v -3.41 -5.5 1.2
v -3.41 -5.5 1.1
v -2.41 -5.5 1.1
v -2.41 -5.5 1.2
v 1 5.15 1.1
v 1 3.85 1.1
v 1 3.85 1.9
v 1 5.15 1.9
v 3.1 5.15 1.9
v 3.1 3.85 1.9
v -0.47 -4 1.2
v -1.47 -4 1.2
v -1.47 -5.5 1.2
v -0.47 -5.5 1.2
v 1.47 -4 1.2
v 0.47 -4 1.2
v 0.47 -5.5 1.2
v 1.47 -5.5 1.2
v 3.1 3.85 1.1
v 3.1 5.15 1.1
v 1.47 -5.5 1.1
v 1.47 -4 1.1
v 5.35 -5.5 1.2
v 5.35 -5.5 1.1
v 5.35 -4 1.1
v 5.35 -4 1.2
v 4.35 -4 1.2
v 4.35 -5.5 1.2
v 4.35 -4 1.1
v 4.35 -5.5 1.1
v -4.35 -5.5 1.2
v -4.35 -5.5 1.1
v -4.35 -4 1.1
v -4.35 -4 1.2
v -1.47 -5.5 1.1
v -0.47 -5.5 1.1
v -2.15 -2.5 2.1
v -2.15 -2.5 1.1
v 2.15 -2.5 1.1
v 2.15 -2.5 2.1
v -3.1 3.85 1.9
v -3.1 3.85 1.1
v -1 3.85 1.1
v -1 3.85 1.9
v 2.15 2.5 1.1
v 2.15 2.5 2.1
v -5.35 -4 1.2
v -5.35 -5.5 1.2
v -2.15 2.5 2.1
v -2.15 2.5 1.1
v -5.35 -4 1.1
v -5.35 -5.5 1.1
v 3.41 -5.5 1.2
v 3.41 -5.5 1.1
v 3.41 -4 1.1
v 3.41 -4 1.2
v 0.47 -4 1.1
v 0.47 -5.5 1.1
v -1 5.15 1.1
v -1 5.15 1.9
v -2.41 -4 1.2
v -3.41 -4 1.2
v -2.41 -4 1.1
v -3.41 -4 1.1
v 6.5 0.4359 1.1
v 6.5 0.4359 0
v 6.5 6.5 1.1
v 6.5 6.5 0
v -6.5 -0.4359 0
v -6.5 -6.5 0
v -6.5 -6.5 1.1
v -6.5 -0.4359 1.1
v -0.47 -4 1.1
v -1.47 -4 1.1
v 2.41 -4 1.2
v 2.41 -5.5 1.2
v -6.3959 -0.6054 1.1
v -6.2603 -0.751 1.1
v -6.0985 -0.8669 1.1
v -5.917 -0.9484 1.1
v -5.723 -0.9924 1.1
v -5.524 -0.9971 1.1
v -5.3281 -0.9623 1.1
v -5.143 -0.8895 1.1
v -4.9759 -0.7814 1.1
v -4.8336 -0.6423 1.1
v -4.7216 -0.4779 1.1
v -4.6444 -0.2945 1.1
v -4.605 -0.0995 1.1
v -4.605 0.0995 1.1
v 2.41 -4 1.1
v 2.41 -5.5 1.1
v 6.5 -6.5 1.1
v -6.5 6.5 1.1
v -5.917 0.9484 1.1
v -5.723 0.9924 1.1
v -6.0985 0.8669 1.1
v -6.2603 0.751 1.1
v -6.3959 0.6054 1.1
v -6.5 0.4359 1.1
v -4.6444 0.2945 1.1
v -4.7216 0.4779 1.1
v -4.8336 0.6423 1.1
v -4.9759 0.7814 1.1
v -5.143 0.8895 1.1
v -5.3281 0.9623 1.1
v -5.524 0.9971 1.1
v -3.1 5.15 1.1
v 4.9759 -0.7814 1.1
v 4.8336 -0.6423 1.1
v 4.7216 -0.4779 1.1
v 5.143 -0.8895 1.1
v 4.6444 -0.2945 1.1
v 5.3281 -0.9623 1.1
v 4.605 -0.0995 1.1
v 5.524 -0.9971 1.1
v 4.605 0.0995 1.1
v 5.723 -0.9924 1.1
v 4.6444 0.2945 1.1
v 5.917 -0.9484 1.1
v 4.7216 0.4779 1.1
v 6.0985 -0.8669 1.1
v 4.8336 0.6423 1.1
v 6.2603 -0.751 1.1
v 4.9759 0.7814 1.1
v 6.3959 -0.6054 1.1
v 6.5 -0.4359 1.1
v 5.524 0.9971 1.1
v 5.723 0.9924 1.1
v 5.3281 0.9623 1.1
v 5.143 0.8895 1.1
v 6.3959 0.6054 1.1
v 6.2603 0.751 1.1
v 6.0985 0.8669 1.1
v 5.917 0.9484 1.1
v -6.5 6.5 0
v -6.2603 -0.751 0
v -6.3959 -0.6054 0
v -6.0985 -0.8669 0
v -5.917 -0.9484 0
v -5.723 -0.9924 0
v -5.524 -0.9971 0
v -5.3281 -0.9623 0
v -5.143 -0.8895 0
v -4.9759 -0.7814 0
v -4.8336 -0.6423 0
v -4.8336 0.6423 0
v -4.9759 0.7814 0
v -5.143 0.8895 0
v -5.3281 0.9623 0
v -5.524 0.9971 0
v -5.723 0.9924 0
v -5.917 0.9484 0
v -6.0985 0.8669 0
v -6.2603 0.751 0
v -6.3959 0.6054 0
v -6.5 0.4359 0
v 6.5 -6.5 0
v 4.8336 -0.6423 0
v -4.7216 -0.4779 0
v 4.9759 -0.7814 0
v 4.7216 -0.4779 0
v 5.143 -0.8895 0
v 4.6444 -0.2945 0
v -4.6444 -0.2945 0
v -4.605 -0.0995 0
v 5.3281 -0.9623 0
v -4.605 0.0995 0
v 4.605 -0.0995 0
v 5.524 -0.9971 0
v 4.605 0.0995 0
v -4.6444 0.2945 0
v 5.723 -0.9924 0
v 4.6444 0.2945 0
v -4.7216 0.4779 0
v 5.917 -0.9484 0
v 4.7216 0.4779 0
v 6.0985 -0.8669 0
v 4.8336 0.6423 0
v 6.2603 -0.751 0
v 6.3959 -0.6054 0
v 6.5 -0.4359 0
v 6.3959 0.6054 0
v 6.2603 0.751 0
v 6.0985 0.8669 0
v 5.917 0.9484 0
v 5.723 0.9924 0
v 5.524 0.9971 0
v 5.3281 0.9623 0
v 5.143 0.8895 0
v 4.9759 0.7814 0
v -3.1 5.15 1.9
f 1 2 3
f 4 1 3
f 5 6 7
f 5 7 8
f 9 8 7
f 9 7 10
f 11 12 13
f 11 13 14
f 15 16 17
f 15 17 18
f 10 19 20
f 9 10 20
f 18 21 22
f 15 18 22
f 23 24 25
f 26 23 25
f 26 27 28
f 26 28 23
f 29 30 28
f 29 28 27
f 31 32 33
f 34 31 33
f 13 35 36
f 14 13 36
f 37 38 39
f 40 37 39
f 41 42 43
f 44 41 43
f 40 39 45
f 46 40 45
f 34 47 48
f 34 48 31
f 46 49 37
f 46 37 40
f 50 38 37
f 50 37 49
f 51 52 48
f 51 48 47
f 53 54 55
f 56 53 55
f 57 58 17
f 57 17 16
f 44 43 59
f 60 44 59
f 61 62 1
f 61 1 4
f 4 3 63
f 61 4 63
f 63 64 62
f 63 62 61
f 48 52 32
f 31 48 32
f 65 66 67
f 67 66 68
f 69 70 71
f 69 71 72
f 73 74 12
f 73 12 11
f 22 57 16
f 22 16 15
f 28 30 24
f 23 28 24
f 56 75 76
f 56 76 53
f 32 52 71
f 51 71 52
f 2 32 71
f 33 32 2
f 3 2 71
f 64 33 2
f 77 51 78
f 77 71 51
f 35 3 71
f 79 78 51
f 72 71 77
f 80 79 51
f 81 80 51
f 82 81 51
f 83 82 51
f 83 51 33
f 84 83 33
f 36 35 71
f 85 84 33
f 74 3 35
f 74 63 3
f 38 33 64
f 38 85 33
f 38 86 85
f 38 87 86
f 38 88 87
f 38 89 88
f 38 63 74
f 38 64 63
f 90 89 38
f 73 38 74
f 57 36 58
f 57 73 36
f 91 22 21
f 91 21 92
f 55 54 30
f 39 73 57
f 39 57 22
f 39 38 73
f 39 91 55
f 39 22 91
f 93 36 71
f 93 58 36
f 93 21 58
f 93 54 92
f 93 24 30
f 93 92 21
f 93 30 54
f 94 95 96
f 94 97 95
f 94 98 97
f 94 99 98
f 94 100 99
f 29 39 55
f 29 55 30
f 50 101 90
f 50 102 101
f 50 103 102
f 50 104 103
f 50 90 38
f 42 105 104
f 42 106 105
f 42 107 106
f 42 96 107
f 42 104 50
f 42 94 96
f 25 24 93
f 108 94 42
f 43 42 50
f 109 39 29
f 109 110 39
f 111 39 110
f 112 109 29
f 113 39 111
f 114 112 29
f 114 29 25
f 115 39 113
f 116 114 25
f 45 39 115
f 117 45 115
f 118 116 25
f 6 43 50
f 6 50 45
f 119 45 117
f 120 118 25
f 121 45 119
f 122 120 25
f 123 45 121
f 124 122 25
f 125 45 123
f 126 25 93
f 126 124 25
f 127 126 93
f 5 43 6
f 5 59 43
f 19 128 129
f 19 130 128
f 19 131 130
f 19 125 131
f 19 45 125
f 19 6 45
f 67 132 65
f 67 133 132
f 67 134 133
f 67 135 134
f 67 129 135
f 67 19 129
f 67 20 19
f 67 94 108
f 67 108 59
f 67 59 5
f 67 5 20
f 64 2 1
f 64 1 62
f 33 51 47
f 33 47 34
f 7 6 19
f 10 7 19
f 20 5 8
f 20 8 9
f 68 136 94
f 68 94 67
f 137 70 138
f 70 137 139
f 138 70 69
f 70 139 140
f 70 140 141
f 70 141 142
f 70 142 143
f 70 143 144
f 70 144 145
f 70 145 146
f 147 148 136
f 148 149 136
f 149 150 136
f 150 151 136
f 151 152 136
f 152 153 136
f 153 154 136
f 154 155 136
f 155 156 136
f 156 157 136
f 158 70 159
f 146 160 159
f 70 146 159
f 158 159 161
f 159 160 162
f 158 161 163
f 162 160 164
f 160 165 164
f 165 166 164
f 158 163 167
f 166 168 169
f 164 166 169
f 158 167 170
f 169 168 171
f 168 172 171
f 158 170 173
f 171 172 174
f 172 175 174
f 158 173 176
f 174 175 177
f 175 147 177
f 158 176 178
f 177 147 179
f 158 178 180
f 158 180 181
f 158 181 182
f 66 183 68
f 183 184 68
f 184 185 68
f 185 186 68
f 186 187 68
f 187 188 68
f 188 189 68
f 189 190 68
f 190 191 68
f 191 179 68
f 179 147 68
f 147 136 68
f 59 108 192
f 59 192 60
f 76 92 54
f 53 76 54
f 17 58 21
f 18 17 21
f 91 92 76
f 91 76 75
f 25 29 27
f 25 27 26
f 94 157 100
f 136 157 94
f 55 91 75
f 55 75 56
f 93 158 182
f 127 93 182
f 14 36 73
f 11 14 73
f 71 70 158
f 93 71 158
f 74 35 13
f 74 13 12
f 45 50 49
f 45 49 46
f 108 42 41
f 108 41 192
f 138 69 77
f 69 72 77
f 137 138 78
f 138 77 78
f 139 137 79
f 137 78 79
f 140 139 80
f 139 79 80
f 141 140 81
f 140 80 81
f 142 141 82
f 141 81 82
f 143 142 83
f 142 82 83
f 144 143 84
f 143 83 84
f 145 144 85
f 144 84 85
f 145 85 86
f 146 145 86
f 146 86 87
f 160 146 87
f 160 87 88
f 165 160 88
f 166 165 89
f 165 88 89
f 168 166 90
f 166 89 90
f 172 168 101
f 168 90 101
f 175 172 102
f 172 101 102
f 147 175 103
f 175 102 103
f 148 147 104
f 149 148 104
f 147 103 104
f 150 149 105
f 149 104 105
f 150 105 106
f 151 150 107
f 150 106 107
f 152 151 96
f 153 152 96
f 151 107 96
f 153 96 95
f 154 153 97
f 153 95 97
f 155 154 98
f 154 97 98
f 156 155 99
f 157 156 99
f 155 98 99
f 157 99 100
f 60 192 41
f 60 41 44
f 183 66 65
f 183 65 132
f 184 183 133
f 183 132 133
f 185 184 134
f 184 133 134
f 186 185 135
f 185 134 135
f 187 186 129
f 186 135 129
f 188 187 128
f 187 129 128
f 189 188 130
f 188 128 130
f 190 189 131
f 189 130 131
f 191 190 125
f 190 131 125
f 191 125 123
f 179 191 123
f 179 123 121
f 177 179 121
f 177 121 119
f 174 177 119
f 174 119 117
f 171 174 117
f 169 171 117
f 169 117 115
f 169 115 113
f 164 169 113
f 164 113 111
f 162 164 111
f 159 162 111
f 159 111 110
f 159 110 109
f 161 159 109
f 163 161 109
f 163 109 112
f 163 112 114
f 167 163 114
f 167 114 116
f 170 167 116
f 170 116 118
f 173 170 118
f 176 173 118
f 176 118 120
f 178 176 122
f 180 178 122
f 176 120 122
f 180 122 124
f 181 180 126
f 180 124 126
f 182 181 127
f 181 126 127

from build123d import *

# Parameters (mm, degrees)
SKETCH_1_W          = 13
SKETCH_1_H          = 13
EXTRUDE_1_DEPTH     = 1.1
SKETCH_2_W          = 4.3
SKETCH_2_H          = 5
EXTRUDE_2_DEPTH     = 1
SKETCH_3_W          = 2.1
SKETCH_3_H          = 1.3
EXTRUDE_3_DEPTH     = 0.8
SKETCH_4_W          = 1
SKETCH_4_H          = 1.5
EXTRUDE_4_DEPTH     = 0.1
SKETCH_5_R          = 1
CUT_EXTRUDE_1_DEPTH = 1.1


with BuildPart() as part:
    # 스케치1 → 보스-돌출1 (new body)
    with BuildSketch(Plane.XY):
        Rectangle(SKETCH_1_W, SKETCH_1_H)
    extrude(amount=EXTRUDE_1_DEPTH)

    # 스케치2 → 보스-돌출2 (add)
    with BuildSketch(Plane.XY.offset(1.1)):
        Rectangle(SKETCH_2_W, SKETCH_2_H)
    extrude(amount=EXTRUDE_2_DEPTH)

    # 스케치3 → 보스-돌출3 (add)
    with BuildSketch(Plane.XY.offset(1.1)):
        with Locations((-2.05, 4.5)):
            Rectangle(SKETCH_3_W, SKETCH_3_H)
        with Locations((2.05, 4.5)):
            Rectangle(SKETCH_3_W, SKETCH_3_H)
    extrude(amount=EXTRUDE_3_DEPTH)

    # 스케치4 → 보스-돌출4 (add)
    with BuildSketch(Plane.XY.offset(1.1)):
        with Locations((-2.91, -4.75)):
            Rectangle(SKETCH_4_W, SKETCH_4_H)
        with Locations((4.85, -4.75)):
            Rectangle(SKETCH_4_W, SKETCH_4_H)
        with Locations((-4.85, -4.75)):
            Rectangle(SKETCH_4_W, SKETCH_4_H)
        with Locations((-0.97, -4.75)):
            Rectangle(SKETCH_4_W, SKETCH_4_H)
        with Locations((0.97, -4.75)):
            Rectangle(SKETCH_4_W, SKETCH_4_H)
        with Locations((2.91, -4.75)):
            Rectangle(SKETCH_4_W, SKETCH_4_H)
    extrude(amount=EXTRUDE_4_DEPTH)

    # 스케치5 → 컷-돌출1 (cut)
    with BuildSketch(Plane.XY.offset(1.1)):
        with Locations((5.6, 0)):
            Circle(SKETCH_5_R)
        with Locations((-5.6, 0)):
            Circle(SKETCH_5_R)
    extrude(amount=-CUT_EXTRUDE_1_DEPTH, mode=Mode.SUBTRACT)


solid = part.part
